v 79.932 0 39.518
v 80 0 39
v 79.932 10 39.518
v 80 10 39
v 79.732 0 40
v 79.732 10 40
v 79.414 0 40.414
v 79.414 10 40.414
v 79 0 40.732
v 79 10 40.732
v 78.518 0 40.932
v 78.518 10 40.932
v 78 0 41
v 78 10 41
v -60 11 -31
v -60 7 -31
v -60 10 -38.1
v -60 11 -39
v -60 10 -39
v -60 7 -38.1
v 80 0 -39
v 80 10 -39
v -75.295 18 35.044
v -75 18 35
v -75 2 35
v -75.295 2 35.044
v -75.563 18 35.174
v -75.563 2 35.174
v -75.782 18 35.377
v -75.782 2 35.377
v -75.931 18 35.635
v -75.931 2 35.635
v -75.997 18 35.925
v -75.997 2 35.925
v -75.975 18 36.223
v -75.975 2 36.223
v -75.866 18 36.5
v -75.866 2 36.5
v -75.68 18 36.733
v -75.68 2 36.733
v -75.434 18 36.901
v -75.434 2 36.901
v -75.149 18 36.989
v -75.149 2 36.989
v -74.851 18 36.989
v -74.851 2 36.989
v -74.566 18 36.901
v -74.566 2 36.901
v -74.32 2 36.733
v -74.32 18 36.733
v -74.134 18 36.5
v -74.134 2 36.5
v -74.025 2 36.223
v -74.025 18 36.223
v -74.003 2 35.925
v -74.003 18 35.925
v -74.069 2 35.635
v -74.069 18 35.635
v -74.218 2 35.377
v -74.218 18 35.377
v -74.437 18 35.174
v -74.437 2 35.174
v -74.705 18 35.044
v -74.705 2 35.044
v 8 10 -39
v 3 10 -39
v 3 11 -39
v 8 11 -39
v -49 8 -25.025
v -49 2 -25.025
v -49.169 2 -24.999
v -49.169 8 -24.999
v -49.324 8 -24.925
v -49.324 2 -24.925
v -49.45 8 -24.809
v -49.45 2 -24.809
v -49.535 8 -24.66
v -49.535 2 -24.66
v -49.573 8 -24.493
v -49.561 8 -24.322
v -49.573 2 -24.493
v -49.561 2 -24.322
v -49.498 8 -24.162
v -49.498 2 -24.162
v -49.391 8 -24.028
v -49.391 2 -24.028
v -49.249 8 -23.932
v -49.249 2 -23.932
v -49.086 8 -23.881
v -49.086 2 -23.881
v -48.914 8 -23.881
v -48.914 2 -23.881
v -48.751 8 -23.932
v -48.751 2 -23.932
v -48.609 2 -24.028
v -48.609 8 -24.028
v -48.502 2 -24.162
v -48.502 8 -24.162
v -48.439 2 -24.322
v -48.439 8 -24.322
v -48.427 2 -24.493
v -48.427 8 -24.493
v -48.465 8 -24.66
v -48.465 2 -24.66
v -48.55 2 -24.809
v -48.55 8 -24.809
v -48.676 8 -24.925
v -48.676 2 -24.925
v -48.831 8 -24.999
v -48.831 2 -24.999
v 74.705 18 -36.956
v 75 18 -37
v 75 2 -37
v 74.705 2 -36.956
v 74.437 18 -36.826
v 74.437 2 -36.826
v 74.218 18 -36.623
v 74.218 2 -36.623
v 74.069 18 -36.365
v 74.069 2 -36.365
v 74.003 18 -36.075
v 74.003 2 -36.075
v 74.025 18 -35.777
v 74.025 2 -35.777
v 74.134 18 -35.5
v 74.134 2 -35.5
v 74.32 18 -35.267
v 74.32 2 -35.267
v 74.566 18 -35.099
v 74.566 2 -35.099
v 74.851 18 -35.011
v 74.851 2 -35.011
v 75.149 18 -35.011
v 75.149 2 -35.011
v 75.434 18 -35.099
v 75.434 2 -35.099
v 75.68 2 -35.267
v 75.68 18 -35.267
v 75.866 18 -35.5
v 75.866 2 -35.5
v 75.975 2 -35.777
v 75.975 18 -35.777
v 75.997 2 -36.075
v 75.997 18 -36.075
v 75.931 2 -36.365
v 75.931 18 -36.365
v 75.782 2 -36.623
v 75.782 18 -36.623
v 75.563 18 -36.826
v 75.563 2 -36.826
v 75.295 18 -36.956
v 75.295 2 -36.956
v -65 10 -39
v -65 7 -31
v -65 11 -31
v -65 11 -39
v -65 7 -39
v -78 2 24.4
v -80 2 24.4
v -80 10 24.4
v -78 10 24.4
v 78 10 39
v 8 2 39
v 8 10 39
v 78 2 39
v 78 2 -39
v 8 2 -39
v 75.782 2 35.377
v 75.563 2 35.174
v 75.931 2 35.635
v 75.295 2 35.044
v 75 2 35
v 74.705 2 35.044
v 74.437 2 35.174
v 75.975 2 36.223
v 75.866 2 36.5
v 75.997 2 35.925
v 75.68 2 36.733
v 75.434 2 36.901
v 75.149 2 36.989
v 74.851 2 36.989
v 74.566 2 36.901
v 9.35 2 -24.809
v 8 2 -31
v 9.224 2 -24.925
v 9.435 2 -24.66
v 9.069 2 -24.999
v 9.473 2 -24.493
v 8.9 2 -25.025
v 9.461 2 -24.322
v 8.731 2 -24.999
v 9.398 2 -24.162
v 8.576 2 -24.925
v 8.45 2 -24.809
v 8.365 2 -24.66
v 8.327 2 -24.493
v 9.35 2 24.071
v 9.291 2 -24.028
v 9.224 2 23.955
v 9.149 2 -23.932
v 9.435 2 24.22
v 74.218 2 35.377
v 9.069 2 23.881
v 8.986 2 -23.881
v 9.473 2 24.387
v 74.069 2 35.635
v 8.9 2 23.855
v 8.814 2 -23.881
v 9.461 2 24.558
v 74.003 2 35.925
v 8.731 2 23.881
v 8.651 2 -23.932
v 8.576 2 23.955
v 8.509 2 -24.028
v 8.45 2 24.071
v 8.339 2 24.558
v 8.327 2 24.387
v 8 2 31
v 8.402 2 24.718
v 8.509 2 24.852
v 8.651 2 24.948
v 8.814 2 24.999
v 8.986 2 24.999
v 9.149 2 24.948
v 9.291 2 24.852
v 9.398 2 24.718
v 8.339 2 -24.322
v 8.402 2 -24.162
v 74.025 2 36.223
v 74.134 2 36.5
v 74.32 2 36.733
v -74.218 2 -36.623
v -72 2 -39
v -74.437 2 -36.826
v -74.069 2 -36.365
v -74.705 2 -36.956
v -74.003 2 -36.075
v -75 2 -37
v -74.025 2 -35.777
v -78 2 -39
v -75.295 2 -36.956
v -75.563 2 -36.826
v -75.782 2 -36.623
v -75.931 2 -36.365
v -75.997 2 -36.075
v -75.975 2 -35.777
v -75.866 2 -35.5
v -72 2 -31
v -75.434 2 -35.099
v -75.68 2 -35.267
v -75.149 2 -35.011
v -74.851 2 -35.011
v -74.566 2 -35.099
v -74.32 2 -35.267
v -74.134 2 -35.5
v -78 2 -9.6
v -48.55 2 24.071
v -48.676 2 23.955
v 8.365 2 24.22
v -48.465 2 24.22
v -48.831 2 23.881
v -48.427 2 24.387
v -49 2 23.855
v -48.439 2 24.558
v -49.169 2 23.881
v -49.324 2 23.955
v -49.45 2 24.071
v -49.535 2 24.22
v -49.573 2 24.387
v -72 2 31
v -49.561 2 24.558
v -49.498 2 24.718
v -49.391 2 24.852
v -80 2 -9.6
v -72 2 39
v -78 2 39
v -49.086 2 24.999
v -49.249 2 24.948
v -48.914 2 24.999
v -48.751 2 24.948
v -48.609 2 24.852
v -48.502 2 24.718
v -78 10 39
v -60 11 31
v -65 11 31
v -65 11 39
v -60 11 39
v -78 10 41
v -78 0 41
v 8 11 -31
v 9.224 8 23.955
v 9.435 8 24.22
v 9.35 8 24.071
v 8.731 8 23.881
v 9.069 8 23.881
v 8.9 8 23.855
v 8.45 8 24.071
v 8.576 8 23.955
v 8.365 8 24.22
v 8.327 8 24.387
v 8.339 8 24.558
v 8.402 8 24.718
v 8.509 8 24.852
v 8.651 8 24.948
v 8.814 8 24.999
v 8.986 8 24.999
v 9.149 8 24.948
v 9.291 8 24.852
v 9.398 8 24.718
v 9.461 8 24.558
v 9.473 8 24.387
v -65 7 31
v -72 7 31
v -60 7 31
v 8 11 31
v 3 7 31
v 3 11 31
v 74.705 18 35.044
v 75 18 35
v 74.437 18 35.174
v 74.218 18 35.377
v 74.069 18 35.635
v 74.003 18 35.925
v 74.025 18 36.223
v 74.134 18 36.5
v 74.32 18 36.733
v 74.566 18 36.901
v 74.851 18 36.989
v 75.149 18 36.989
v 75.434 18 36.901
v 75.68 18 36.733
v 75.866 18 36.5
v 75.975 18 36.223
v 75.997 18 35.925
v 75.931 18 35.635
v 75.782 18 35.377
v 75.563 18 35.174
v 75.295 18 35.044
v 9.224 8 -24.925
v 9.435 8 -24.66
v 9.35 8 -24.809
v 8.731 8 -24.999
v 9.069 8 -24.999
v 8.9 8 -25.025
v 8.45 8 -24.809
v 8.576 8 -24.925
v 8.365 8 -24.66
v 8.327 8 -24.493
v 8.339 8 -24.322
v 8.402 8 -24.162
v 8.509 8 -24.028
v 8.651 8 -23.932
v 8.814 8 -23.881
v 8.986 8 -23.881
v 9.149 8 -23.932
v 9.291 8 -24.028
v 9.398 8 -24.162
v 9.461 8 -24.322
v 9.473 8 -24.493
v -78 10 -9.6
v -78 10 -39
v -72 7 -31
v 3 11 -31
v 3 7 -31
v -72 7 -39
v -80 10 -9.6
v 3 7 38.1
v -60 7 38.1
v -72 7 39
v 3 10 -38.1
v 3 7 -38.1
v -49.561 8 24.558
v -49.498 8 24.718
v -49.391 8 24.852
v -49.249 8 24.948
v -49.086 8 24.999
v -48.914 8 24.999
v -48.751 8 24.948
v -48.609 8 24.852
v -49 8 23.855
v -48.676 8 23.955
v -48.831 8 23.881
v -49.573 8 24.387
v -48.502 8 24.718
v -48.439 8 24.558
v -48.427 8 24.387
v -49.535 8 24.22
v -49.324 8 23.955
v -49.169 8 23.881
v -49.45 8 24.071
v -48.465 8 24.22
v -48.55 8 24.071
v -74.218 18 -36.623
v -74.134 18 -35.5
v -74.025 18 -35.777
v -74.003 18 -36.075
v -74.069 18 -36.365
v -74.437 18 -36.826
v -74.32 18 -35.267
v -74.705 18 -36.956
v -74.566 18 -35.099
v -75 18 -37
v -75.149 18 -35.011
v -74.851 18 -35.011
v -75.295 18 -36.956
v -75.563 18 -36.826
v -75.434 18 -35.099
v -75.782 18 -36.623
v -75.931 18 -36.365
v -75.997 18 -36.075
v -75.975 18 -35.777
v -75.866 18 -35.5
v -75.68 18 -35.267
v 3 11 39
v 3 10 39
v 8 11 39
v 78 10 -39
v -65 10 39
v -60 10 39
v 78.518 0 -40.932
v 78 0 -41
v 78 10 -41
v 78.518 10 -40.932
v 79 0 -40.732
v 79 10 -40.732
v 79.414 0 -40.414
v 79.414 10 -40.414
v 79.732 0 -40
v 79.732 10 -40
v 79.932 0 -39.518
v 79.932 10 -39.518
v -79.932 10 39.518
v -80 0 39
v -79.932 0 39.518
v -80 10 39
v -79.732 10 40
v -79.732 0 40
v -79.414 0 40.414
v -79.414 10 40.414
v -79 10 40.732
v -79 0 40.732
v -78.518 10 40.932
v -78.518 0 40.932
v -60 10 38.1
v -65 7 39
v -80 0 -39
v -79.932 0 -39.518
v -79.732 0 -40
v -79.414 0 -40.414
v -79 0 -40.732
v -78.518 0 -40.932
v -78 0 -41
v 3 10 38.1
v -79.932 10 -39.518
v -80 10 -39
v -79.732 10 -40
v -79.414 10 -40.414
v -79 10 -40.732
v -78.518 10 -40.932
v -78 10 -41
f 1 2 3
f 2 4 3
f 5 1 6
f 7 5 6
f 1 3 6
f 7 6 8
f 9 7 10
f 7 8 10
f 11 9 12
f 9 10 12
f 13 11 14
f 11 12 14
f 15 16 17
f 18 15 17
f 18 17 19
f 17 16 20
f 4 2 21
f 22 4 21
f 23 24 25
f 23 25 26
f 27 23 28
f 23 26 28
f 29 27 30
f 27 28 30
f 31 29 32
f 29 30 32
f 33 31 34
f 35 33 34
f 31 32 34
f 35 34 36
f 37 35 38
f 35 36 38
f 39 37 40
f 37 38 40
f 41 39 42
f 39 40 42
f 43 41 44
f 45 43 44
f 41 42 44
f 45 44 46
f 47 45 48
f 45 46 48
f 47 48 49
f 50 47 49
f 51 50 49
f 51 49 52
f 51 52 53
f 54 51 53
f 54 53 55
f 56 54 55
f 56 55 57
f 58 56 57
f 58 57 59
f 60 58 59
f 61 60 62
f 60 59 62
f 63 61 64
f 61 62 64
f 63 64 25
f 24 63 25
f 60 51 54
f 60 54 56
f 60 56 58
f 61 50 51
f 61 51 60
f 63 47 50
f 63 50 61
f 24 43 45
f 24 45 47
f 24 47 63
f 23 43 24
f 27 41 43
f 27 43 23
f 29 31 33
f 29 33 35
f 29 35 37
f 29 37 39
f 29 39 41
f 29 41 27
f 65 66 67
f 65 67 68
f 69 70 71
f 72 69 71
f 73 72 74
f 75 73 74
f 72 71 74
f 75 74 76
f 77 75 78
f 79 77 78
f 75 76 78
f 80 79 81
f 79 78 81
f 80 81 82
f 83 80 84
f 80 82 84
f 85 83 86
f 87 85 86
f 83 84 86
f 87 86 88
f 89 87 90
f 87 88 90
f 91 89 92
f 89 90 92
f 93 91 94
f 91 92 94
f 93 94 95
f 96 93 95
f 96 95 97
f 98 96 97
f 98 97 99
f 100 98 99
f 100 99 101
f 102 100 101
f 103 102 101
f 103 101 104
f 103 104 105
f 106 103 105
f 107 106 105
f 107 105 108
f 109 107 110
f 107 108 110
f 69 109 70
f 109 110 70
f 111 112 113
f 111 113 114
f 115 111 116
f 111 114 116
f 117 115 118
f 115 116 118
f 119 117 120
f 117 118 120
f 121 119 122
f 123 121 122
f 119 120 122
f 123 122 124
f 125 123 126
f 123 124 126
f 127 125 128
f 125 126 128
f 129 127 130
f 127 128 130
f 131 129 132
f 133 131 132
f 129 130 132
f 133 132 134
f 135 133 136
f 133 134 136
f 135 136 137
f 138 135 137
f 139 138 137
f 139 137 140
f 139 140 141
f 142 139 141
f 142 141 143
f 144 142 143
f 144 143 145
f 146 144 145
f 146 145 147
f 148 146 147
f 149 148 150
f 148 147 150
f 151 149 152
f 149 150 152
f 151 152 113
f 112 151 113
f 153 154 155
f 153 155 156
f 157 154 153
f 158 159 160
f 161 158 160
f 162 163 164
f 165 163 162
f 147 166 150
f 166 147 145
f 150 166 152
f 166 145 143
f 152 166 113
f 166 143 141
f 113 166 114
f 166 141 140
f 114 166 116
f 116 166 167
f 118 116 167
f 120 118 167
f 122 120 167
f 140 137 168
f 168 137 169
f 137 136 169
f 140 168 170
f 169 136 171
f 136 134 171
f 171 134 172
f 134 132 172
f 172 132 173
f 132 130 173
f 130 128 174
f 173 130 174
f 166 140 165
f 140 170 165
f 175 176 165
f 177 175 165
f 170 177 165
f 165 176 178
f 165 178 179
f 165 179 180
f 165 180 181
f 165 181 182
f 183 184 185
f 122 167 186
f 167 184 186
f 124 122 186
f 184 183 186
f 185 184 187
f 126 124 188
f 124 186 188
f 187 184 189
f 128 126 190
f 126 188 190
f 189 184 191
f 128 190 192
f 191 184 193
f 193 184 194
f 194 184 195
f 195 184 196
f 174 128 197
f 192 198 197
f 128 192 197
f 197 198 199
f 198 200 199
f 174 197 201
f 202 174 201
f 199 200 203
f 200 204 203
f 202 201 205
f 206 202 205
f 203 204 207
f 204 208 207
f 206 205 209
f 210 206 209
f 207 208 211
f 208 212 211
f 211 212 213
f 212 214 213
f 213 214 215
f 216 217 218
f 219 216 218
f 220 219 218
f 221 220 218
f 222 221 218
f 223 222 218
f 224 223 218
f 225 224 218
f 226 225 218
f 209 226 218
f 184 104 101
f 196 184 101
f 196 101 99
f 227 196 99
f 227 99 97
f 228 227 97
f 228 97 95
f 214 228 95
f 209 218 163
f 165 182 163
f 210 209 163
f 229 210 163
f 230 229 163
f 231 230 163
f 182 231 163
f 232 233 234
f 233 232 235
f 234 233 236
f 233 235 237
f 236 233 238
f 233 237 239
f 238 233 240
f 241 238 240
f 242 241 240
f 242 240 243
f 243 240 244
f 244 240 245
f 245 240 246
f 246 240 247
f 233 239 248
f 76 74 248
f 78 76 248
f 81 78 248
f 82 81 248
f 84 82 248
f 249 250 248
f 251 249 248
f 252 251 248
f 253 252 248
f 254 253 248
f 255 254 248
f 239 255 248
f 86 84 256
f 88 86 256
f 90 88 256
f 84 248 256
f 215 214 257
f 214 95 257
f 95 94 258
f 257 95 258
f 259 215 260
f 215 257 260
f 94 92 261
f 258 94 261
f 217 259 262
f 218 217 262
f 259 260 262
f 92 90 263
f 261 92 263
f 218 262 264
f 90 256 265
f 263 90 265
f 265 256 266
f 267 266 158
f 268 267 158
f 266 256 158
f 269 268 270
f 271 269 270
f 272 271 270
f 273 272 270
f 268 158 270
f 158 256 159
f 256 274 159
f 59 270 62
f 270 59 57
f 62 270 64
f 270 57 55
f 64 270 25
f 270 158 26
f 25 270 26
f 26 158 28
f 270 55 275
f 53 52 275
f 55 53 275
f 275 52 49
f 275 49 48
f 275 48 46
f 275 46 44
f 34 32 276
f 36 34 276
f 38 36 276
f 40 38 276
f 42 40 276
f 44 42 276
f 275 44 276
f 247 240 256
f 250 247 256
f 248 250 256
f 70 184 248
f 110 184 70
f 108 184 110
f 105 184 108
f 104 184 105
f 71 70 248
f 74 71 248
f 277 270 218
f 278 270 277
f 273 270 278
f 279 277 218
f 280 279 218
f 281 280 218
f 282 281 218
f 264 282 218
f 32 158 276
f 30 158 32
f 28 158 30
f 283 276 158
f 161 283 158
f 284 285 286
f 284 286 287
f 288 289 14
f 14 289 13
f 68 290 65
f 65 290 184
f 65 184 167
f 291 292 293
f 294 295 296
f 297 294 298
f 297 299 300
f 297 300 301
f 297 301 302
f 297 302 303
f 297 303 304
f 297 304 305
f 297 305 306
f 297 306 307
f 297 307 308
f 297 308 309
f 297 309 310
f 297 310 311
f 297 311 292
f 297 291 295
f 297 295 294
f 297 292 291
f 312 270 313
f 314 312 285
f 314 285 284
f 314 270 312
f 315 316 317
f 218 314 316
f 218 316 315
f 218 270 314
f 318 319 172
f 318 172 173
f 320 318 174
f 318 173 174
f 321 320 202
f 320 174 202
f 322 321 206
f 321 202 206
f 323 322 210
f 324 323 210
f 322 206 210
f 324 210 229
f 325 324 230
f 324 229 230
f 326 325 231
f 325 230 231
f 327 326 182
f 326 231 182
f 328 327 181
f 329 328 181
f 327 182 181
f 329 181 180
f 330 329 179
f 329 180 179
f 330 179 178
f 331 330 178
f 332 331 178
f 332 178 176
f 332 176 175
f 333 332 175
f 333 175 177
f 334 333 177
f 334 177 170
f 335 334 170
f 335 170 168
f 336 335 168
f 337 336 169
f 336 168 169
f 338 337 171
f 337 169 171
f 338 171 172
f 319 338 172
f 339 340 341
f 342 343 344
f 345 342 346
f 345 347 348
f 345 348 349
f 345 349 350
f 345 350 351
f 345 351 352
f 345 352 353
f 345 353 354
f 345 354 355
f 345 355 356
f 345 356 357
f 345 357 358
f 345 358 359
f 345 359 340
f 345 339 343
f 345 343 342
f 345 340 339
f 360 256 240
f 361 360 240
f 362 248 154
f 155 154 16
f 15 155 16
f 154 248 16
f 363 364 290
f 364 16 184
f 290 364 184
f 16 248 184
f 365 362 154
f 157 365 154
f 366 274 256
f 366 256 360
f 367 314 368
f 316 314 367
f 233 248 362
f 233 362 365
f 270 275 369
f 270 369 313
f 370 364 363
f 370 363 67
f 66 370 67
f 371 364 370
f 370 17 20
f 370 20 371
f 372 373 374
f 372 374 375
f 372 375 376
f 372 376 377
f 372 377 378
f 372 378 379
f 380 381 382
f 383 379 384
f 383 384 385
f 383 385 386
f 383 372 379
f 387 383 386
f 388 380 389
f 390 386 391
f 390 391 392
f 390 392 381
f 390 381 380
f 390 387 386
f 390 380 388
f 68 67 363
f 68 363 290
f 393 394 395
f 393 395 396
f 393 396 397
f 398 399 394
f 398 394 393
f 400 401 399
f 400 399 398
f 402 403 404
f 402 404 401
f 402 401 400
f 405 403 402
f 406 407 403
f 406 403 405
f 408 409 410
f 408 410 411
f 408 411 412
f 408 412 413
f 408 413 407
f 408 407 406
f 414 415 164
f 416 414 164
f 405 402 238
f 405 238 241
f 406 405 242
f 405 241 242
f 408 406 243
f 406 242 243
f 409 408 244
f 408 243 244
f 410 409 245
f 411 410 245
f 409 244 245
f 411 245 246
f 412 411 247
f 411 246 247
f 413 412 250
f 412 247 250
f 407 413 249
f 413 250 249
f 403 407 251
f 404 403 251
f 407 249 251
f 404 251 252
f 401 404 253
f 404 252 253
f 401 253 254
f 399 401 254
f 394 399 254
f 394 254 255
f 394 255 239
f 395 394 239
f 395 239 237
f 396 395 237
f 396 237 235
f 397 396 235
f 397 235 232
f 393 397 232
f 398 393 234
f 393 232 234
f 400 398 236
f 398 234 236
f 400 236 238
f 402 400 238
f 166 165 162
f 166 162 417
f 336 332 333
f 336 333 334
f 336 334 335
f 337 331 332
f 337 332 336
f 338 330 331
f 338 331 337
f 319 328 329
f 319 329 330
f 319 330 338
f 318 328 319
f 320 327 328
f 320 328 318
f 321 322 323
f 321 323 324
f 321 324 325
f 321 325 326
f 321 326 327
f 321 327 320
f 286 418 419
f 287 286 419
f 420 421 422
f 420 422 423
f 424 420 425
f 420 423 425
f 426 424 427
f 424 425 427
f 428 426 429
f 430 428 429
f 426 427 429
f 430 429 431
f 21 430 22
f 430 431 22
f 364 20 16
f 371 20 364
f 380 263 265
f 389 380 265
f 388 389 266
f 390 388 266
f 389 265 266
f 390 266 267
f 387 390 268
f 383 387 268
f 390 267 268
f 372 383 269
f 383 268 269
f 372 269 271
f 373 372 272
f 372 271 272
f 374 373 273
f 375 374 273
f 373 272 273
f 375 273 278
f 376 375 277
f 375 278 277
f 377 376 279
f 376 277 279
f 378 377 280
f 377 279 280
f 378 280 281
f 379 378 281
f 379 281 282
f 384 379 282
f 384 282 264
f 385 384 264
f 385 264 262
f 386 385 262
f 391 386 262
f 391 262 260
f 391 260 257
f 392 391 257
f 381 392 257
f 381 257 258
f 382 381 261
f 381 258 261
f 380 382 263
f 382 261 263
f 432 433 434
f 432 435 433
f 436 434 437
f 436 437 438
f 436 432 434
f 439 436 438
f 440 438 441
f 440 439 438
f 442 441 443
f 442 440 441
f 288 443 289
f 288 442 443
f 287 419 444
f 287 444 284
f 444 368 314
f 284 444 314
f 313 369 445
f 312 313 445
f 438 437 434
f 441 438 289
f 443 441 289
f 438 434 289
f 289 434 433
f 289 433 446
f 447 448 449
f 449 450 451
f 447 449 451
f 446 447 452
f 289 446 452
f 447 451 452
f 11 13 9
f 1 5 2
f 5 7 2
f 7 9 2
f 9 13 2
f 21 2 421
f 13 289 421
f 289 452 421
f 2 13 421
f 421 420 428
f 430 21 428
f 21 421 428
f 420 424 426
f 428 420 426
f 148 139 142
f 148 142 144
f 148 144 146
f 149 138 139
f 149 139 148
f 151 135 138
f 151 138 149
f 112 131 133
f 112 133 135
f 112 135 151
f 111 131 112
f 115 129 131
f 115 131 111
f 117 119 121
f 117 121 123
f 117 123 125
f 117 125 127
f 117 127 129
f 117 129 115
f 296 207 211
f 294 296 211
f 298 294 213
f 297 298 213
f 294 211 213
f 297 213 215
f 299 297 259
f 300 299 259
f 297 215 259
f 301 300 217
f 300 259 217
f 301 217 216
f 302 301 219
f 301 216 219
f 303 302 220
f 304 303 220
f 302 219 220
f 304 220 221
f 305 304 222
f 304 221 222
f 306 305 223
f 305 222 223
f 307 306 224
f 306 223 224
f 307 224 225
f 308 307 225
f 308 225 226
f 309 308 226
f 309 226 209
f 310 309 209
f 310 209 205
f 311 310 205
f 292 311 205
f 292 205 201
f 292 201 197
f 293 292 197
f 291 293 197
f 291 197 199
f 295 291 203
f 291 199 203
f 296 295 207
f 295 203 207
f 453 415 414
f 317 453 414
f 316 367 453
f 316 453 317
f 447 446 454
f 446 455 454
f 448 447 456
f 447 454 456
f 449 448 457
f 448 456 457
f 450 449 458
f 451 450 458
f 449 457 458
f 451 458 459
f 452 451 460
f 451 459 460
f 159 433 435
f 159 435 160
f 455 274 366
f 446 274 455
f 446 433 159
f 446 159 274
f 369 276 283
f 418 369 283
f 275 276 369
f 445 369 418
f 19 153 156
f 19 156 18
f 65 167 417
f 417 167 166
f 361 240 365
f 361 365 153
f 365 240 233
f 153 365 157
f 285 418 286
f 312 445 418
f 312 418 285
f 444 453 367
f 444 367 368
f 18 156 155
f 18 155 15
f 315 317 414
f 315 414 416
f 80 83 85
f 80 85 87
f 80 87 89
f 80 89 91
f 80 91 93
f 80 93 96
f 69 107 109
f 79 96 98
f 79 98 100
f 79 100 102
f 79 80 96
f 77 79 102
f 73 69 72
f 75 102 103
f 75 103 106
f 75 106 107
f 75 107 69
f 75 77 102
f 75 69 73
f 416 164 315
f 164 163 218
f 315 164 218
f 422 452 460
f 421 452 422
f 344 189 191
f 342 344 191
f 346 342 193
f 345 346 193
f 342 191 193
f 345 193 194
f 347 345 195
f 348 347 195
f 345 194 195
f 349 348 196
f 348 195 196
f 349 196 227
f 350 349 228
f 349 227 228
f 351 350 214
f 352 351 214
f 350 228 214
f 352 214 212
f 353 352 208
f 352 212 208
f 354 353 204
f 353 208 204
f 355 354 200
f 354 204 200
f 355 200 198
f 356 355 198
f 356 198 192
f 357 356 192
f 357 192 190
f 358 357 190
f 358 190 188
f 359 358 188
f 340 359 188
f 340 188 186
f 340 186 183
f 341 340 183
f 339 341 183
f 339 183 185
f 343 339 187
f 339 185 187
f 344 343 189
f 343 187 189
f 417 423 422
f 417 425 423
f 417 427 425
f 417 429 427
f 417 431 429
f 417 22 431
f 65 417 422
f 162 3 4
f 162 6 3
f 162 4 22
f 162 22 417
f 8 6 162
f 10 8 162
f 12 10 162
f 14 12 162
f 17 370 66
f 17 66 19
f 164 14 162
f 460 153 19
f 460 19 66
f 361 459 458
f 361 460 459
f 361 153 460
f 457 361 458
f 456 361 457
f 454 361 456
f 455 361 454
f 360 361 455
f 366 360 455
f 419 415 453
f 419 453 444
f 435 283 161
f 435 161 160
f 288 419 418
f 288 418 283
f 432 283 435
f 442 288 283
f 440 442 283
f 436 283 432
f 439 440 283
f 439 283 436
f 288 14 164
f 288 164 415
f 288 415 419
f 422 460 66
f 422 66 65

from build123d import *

# Parameters (mm, degrees)
SKETCH1_W           = 160
SKETCH1_H           = 82
BOSS_EXTRUDE1_DEPTH = 10
SHELL1_T            = -2
SKETCH2_R           = 1
BOSS_EXTRUDE2_DEPTH = 16
FILLET1_R           = 2
FILLET2_R           = 2
FILLET3_R           = 2
FILLET4_R           = 2
SKETCH7_R           = 0.575
BOSS_EXTRUDE3_DEPTH = 6
SKETCH10_W          = 34
SKETCH10_H          = 8.029729716
CUT_EXTRUDE1_DEPTH  = 6
SKETCH16_W          = 80
SKETCH16_H          = 8
BOSS_EXTRUDE5_DEPTH = 5
SKETCH18_W          = 5
SKETCH18_H          = 8
BOSS_EXTRUDE6_DEPTH = 4
SKETCH21_W          = 63
SKETCH21_H          = 3
BOSS_EXTRUDE7_DEPTH = 0.9
SKETCH22_W          = 63
SKETCH22_H          = 3
BOSS_EXTRUDE8_DEPTH = 0.9


with BuildPart() as part:
    # Sketch1 → Boss-Extrude1 (new body)
    with BuildSketch(Plane(origin=(0, 0, 0), x_dir=(1, 0, 0), z_dir=(0, 1, 0))):
        Rectangle(SKETCH1_W, SKETCH1_H)
    extrude(amount=BOSS_EXTRUDE1_DEPTH)

    # Shell1
    shell1_openings = [part.faces().sort_by_distance(p)[0] for p in [
        (0, 10, 0),
    ]]
    offset(amount=SHELL1_T, openings=shell1_openings, kind=Kind.INTERSECTION)

    # Sketch2 → Boss-Extrude2 (add)
    with BuildSketch(Plane(origin=(0, 2, 0), x_dir=(1, 0, 0), z_dir=(0, 1, 0))):
        with Locations(Location((-75, 36, 0), (0, 0, 90))):
            Circle(SKETCH2_R)
        with Locations(Location((75, 36, 0), (0, 0, 90))):
            Circle(SKETCH2_R)
        with Locations(Location((75, -36, 0), (0, 0, 90))):
            Circle(SKETCH2_R)
        with Locations(Location((-75, -36, 0), (0, 0, 90))):
            Circle(SKETCH2_R)
    extrude(amount=BOSS_EXTRUDE2_DEPTH)

    # Fillet1
    fillet1_edges = [part.edges().sort_by_distance(p)[0] for p in [
        (-80, 5, 41),
    ]]
    fillet(fillet1_edges, radius=FILLET1_R)

    # Fillet2
    fillet2_edges = [part.edges().sort_by_distance(p)[0] for p in [
        (-80, 5, -41),
    ]]
    fillet(fillet2_edges, radius=FILLET2_R)

    # Fillet3
    fillet3_edges = [part.edges().sort_by_distance(p)[0] for p in [
        (80, 5, -41),
    ]]
    fillet(fillet3_edges, radius=FILLET3_R)

    # Fillet4
    fillet4_edges = [part.edges().sort_by_distance(p)[0] for p in [
        (80, 5, 41),
    ]]
    fillet(fillet4_edges, radius=FILLET4_R)

    # Sketch7 → Boss-Extrude3 (add)
    with BuildSketch(Plane(origin=(0, 2, 0), x_dir=(1, 0, 0), z_dir=(0, 1, 0))):
        with Locations(Location((-49, 24.45, 0), (0, 0, 90))):
            Circle(SKETCH7_R)
        with Locations(Location((-49, -24.43, 0), (0, 0, 90))):
            Circle(SKETCH7_R)
        with Locations(Location((8.9, -24.43, 0), (0, 0, 90))):
            Circle(SKETCH7_R)
        with Locations(Location((8.9, 24.45, 0), (0, 0, 90))):
            Circle(SKETCH7_R)
    extrude(amount=BOSS_EXTRUDE3_DEPTH)

    # Sketch10 → Cut-Extrude1 (cut)
    with BuildSketch(Plane.ZY.offset(80)):
        with Locations((7.4, 6.014864858)):
            Rectangle(SKETCH10_W, SKETCH10_H)
    extrude(amount=-CUT_EXTRUDE1_DEPTH, mode=Mode.SUBTRACT)

    # Sketch16 → Boss-Extrude5 (add)
    with BuildSketch(Plane(origin=(0, 2, 0), x_dir=(1, 0, 0), z_dir=(0, 1, 0))):
        with Locations((-32, 35)):
            Rectangle(SKETCH16_W, SKETCH16_H)
        with Locations((-32, -35)):
            Rectangle(SKETCH16_W, SKETCH16_H)
    extrude(amount=BOSS_EXTRUDE5_DEPTH)

    # Sketch18 → Boss-Extrude6 (add)
    with BuildSketch(Plane(origin=(0, 7, 0), x_dir=(1, 0, 0), z_dir=(0, 1, 0))):
        with Locations((-62.5, 35)):
            Rectangle(SKETCH18_W, SKETCH18_H)
        with Locations((5.5, 35)):
            Rectangle(SKETCH18_W, SKETCH18_H)
        with Locations((5.5, -35)):
            Rectangle(SKETCH18_W, SKETCH18_H)
        with Locations((-62.5, -35)):
            Rectangle(SKETCH18_W, SKETCH18_H)
    extrude(amount=BOSS_EXTRUDE6_DEPTH)

    # Sketch21 → Boss-Extrude7 (add)
    with BuildSketch(Plane.XY.offset(-39)):
        with Locations((-28.5, 8.5)):
            Rectangle(SKETCH21_W, SKETCH21_H)
    extrude(amount=BOSS_EXTRUDE7_DEPTH)

    # Sketch22 → Boss-Extrude8 (add)
    with BuildSketch(Plane(origin=(0, 0, 39), x_dir=(-1, 0, 0), z_dir=(0, 0, -1))):
        with Locations((28.5, 8.5)):
            Rectangle(SKETCH22_W, SKETCH22_H)
    extrude(amount=BOSS_EXTRUDE8_DEPTH)


solid = part.part
